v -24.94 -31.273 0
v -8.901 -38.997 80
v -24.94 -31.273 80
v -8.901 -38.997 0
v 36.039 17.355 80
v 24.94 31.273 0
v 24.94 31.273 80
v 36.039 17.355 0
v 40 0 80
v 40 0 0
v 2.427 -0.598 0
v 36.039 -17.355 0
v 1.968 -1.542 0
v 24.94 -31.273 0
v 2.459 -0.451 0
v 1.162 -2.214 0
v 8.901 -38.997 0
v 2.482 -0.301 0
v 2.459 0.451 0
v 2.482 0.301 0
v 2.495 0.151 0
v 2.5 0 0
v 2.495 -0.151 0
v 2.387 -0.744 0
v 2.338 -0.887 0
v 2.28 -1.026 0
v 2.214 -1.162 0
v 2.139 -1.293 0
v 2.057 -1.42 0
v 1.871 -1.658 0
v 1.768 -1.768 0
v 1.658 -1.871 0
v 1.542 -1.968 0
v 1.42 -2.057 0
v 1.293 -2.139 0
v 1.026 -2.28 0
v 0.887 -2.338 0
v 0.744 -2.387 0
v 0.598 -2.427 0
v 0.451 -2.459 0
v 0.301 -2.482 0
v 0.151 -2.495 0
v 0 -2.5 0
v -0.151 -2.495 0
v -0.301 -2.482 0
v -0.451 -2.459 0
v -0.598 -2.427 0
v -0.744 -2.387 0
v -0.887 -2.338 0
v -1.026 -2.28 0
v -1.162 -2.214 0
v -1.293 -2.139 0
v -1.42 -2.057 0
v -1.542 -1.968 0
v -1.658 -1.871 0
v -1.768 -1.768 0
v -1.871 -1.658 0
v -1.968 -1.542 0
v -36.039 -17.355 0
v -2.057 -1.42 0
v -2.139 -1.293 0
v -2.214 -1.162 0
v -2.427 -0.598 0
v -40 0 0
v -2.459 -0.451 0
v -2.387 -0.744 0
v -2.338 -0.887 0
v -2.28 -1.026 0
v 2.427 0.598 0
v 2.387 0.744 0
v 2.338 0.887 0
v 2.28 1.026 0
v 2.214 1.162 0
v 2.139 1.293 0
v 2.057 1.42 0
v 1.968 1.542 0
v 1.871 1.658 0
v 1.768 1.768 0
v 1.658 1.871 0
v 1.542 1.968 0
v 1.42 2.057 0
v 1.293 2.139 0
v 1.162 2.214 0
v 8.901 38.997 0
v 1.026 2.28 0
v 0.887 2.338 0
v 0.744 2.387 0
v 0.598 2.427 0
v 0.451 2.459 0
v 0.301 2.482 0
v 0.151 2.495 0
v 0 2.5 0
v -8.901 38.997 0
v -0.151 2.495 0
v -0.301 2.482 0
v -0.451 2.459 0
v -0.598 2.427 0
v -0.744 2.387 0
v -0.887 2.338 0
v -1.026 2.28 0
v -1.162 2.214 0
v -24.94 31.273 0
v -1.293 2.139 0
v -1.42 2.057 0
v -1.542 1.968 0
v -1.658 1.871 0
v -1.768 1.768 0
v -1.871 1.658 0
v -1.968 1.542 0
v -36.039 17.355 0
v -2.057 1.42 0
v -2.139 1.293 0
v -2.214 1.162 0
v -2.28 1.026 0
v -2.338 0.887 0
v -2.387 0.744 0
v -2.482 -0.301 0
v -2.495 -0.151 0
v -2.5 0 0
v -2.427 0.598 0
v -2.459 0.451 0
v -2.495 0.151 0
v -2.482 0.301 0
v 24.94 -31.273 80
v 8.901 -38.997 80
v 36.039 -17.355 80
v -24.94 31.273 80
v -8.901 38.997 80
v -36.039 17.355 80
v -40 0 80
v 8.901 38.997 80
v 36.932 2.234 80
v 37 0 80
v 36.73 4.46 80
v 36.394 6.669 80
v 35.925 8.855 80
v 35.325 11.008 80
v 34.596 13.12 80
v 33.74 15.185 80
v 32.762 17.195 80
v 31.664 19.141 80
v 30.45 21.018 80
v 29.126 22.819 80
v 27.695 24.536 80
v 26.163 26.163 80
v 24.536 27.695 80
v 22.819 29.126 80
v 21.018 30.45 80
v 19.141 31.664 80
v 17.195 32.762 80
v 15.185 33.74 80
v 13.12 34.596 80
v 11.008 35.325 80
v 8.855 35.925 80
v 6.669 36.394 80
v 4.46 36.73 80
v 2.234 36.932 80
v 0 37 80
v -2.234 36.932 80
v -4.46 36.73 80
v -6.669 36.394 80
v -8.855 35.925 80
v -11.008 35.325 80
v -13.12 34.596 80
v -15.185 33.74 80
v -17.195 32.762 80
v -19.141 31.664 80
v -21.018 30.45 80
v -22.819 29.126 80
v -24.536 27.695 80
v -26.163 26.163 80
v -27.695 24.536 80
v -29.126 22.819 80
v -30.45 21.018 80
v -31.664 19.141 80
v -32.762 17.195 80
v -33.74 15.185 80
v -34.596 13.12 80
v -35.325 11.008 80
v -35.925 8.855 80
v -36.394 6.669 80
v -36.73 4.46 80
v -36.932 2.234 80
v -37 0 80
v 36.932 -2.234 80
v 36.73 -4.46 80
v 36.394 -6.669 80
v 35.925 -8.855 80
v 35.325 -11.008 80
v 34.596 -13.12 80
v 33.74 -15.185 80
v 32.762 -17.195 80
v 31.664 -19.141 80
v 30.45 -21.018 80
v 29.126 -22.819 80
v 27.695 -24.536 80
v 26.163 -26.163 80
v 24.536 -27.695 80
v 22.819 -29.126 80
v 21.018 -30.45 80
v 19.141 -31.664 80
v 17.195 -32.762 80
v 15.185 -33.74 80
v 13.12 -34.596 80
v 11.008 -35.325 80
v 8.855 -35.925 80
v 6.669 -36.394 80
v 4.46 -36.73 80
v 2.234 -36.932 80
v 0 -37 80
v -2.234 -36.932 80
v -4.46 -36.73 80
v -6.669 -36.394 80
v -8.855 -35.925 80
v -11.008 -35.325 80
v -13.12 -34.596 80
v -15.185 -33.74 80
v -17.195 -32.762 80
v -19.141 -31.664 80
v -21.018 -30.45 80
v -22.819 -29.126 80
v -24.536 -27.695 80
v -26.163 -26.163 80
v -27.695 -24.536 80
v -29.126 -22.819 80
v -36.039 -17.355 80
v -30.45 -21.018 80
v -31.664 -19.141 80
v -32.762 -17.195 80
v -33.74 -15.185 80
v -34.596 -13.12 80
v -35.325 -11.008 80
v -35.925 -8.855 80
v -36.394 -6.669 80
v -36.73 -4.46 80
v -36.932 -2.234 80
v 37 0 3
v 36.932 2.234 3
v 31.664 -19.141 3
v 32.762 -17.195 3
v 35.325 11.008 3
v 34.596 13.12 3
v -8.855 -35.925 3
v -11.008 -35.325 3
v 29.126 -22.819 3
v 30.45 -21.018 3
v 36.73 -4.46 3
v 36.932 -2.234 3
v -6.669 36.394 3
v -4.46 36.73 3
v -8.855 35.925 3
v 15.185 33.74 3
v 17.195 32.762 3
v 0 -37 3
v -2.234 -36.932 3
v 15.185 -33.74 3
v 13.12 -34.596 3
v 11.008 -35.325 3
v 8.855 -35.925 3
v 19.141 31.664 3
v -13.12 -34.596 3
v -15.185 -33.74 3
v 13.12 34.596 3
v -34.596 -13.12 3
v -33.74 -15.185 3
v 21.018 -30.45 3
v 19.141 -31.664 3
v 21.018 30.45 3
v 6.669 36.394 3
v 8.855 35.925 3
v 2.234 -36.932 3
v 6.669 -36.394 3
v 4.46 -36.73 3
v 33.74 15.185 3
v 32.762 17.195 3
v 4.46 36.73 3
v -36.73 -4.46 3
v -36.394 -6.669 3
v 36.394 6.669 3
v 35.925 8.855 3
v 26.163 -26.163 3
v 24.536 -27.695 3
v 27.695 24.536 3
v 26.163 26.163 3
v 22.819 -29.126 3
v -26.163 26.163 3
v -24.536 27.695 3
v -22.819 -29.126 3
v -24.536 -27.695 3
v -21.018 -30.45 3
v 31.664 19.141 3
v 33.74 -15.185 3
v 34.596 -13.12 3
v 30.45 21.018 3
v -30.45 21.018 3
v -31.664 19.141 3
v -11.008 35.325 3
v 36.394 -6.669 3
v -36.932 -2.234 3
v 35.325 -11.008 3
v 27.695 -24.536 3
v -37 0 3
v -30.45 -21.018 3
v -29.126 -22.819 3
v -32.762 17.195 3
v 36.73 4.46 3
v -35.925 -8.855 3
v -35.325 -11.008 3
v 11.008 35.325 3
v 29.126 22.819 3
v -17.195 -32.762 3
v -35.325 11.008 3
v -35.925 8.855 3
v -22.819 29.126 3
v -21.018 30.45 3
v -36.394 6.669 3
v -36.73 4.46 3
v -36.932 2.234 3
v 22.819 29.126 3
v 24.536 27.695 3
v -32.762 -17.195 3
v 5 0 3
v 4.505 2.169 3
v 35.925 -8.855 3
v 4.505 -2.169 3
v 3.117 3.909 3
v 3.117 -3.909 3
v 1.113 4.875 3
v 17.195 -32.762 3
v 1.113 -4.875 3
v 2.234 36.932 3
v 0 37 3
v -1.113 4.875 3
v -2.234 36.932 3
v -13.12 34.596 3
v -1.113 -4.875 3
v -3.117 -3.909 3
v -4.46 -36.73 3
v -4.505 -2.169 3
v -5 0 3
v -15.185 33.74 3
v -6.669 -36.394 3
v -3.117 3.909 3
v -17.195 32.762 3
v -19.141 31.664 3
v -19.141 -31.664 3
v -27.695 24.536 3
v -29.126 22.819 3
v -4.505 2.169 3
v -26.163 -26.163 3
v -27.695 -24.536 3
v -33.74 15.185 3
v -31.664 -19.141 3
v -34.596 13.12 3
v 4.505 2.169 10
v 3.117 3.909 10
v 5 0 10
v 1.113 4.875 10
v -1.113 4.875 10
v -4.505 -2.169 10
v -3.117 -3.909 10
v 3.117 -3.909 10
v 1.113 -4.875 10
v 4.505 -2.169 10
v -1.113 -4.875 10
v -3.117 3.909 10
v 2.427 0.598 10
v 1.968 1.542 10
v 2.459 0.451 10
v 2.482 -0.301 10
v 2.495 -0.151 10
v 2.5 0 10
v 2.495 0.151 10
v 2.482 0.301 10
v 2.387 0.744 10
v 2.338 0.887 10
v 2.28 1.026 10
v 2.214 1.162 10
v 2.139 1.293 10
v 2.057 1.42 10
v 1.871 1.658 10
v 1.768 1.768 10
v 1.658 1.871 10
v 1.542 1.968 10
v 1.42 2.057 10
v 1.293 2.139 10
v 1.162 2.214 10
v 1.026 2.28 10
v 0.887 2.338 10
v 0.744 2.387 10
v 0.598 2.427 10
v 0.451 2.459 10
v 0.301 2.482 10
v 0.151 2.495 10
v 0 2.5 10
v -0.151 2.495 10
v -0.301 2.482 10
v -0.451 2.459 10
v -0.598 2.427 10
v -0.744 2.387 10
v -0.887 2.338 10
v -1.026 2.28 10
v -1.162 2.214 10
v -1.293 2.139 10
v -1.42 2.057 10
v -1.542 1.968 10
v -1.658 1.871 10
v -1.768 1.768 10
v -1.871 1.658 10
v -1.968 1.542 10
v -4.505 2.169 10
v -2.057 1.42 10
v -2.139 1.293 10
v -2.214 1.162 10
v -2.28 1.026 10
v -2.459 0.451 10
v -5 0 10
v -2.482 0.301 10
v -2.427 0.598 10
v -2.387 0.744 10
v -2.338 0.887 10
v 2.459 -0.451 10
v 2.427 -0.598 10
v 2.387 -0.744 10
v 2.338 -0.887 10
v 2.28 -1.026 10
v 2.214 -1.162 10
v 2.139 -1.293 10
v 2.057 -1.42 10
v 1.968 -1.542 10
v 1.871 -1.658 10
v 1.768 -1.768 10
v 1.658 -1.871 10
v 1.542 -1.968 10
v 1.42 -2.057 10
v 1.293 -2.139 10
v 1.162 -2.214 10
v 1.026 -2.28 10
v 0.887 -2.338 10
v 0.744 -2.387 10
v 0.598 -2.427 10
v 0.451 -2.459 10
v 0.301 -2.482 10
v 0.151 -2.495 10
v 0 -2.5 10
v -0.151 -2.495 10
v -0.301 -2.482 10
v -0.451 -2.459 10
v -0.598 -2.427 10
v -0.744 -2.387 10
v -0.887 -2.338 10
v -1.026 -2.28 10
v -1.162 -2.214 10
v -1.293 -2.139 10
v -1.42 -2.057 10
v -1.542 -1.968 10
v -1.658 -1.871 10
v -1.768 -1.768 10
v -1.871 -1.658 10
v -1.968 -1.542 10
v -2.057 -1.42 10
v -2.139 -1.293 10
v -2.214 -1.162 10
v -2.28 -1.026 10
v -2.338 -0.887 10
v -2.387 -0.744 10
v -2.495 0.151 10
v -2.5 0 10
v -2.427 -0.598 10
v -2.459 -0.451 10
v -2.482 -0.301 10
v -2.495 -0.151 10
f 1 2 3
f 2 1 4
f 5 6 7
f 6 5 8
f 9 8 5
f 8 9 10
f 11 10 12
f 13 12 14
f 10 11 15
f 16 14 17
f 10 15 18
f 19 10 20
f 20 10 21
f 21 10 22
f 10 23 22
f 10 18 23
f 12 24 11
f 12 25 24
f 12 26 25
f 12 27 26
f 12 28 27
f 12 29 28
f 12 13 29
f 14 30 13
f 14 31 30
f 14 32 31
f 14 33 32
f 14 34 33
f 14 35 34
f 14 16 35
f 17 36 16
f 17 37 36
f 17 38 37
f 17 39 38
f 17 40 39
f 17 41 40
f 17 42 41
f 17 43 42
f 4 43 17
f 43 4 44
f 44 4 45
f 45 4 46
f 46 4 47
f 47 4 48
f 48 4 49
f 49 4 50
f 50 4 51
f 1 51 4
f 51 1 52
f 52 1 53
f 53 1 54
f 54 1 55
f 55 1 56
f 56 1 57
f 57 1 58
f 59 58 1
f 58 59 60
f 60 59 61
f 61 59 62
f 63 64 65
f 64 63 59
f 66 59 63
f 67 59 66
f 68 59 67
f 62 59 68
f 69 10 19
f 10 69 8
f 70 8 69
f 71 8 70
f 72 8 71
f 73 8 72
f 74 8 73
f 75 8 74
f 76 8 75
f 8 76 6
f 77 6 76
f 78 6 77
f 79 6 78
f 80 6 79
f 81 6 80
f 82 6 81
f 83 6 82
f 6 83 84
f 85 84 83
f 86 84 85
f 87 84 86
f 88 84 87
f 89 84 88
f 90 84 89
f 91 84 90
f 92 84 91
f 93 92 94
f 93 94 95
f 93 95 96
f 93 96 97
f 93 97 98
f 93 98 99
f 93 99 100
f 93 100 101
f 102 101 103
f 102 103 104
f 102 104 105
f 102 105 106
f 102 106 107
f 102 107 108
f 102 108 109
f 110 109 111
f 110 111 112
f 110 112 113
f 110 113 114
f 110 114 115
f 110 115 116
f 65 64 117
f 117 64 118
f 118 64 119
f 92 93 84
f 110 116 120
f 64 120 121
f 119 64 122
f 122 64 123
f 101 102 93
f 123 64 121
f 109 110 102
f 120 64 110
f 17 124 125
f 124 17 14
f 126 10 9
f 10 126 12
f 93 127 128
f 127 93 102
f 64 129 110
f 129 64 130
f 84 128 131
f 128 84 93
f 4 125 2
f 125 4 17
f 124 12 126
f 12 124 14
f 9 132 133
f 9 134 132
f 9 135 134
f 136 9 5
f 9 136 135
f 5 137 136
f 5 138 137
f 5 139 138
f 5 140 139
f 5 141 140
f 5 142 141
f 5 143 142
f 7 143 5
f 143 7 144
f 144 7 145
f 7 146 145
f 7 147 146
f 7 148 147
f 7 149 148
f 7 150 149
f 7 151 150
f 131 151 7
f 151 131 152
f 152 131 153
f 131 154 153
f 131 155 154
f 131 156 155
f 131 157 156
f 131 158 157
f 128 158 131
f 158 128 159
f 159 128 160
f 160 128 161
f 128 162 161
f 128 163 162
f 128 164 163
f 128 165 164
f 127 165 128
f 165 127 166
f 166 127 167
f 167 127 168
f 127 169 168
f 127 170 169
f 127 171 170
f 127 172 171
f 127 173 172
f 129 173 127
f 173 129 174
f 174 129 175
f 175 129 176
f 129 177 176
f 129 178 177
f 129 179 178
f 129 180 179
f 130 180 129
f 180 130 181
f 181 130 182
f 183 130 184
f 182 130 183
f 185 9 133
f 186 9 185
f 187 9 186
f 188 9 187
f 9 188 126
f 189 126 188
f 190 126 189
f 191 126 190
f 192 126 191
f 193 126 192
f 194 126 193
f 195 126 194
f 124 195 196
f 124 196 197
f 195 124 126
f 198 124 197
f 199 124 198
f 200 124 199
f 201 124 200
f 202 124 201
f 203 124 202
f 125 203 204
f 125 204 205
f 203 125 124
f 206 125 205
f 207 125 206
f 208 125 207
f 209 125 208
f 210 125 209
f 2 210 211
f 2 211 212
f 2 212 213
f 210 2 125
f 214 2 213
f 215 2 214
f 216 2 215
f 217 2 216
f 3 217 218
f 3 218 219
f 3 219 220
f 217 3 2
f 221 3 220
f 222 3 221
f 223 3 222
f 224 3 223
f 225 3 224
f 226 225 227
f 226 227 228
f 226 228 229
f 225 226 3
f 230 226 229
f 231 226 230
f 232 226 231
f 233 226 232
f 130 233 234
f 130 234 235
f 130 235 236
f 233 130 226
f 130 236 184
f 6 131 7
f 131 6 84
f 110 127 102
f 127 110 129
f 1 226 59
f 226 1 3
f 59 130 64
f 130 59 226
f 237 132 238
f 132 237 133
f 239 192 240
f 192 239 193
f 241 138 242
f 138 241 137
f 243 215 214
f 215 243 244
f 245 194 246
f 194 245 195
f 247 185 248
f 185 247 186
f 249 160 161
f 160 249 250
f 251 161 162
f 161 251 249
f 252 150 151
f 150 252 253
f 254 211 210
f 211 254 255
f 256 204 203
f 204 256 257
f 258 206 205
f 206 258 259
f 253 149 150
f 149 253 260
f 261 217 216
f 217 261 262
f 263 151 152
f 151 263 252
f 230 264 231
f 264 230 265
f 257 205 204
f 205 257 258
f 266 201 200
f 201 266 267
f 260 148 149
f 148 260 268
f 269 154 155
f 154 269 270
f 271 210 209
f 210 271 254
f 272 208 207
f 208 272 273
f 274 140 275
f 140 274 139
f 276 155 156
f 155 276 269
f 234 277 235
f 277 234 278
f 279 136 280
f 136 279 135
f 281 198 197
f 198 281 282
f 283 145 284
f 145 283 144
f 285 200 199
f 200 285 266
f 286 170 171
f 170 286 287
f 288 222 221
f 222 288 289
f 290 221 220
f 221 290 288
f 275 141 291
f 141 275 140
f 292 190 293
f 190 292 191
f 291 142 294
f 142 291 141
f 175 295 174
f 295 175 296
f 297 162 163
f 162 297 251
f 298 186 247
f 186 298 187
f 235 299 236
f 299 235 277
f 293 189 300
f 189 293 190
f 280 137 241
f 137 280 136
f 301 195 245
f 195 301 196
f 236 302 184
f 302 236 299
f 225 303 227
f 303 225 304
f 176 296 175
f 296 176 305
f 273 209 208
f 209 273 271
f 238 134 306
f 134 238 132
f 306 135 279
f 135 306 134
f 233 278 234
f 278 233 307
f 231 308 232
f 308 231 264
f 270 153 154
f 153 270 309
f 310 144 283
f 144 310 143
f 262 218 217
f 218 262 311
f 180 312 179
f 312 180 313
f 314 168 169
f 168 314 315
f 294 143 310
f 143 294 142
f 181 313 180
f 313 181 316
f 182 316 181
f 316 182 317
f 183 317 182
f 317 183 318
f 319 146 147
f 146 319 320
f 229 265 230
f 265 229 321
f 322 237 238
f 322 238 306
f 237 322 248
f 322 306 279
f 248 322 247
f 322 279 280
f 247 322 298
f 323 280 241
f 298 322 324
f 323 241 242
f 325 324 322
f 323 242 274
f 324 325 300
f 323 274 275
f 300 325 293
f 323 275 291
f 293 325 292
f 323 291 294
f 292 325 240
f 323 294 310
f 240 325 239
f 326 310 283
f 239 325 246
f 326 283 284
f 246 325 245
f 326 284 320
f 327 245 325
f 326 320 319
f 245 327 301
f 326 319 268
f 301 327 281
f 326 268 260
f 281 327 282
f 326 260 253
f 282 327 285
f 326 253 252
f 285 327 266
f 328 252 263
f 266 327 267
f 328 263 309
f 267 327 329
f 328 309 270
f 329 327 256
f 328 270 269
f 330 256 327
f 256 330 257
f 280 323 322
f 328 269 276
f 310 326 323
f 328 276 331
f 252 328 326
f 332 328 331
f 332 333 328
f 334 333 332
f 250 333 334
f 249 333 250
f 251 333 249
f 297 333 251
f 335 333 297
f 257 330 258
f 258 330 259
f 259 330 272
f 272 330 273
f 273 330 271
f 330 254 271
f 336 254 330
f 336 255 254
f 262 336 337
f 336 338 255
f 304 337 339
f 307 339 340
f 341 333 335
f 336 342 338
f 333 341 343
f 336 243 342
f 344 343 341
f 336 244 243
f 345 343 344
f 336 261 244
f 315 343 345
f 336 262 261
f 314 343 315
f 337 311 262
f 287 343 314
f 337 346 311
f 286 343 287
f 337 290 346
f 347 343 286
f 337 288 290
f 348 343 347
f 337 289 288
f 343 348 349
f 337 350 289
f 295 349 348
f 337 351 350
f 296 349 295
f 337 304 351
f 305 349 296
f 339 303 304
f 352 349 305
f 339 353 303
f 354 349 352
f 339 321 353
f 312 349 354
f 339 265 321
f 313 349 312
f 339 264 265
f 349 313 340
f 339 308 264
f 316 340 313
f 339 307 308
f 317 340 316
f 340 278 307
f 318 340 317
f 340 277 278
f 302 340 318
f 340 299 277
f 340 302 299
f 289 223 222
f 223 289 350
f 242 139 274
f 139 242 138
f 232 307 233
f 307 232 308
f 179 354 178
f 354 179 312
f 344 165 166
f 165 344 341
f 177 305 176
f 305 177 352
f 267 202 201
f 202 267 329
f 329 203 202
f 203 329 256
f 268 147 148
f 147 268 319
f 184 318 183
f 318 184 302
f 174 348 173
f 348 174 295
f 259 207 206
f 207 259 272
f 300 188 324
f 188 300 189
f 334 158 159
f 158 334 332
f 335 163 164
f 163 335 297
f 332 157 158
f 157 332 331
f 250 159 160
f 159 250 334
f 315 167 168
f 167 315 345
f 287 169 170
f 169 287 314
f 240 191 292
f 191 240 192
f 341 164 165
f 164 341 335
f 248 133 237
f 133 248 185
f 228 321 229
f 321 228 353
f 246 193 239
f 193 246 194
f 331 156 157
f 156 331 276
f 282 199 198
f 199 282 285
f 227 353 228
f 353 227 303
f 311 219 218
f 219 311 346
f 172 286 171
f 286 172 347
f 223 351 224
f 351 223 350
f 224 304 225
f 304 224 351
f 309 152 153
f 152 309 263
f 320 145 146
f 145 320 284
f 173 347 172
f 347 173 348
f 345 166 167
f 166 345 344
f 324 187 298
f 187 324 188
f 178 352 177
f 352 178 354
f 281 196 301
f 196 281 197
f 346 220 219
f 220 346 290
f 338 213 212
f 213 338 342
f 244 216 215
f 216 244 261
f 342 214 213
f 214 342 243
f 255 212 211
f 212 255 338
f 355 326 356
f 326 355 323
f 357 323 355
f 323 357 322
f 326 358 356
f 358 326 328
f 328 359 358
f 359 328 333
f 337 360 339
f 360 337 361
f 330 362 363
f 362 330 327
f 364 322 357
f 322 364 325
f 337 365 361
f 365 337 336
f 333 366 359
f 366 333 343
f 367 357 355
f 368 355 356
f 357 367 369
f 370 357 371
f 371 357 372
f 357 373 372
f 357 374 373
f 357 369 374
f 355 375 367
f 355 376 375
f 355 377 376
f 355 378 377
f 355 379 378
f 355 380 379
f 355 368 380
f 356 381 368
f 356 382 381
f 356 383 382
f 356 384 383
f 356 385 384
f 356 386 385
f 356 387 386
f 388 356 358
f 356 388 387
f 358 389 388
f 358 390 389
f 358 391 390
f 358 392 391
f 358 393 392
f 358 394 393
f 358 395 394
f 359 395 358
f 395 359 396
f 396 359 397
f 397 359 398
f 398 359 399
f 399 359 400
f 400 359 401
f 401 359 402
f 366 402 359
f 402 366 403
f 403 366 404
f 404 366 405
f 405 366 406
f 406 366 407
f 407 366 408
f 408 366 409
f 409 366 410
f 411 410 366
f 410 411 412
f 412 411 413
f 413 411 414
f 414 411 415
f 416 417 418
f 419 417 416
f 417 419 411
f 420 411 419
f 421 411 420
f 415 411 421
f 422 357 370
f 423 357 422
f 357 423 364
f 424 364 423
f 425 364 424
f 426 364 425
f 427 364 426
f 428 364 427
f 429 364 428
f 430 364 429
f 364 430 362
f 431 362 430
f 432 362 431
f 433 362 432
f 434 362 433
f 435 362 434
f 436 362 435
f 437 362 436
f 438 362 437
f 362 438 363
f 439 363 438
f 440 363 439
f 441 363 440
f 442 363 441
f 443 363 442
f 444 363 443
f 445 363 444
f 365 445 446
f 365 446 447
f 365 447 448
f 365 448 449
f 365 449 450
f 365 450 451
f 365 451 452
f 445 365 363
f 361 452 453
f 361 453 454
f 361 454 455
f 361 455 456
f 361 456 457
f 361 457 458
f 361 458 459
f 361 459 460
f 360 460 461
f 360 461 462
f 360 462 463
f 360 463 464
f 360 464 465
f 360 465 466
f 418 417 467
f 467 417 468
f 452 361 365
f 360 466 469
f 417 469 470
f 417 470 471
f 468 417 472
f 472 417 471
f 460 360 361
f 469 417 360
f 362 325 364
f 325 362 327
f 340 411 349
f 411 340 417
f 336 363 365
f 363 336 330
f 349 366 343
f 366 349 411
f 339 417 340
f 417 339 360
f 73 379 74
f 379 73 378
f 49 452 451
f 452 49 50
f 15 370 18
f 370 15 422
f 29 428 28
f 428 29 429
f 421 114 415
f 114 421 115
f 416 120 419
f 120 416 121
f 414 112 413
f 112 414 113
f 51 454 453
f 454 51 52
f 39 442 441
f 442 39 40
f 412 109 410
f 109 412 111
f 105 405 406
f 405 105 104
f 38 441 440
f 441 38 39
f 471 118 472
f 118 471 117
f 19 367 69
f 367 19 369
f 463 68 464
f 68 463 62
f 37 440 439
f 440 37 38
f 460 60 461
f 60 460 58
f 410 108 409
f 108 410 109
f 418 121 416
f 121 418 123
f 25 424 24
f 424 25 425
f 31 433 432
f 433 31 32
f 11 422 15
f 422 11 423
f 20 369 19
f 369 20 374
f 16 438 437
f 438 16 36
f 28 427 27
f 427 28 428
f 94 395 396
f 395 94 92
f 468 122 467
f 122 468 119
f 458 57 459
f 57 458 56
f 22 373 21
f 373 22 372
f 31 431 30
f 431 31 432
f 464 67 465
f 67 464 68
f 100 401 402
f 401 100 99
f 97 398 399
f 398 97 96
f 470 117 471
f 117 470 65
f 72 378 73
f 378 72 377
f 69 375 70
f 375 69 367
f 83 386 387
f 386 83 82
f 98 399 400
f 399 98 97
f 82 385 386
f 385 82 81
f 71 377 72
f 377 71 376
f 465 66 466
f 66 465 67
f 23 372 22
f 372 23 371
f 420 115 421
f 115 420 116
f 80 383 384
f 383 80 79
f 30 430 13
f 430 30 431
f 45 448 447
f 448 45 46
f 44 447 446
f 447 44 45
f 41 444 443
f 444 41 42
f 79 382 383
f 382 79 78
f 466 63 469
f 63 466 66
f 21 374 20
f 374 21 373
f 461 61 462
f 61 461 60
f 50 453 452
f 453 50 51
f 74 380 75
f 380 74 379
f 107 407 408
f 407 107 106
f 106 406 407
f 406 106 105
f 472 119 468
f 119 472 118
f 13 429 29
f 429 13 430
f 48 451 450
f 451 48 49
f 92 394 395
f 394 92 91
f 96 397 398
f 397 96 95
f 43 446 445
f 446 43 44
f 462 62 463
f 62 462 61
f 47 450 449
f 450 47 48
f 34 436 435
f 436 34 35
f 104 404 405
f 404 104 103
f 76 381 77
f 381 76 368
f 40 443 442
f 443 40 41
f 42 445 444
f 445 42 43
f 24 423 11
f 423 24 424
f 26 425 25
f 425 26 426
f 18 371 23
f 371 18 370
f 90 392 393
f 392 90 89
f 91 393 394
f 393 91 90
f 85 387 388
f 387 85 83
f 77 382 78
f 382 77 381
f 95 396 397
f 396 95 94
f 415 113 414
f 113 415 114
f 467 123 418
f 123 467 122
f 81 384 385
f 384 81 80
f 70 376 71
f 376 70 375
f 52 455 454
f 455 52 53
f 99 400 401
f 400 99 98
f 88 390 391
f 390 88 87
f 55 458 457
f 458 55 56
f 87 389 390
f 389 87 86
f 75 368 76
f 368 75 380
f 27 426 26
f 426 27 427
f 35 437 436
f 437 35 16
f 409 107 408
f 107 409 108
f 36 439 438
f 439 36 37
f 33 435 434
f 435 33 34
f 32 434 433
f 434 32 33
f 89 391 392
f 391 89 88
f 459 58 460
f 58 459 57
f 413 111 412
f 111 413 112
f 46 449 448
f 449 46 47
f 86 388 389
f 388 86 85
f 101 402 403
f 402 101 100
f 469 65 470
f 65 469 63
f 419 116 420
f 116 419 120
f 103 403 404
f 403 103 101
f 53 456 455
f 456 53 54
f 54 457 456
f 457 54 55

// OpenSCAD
EPS=0.01;
FN=104;

PipeOuterRadius=40;
PipeHeight=80;
Wanddicke=3;
Kabeldicke=5;

difference() {
  union() {
    difference() {
        cylinder(h=PipeHeight, r=PipeOuterRadius, center = false, $fn=14);
        translate([0,0,Wanddicke])
          cylinder(h=PipeHeight, center = false, $fn=FN, r=PipeOuterRadius-Wanddicke);
    }
    cylinder(h=10, r=Kabeldicke, center = false, $fn=14);
  }


  translate([0,0,-EPS])
    cylinder(h=PipeHeight+2*EPS, center = false, $fn=FN, r=Kabeldicke/2.0);
}
